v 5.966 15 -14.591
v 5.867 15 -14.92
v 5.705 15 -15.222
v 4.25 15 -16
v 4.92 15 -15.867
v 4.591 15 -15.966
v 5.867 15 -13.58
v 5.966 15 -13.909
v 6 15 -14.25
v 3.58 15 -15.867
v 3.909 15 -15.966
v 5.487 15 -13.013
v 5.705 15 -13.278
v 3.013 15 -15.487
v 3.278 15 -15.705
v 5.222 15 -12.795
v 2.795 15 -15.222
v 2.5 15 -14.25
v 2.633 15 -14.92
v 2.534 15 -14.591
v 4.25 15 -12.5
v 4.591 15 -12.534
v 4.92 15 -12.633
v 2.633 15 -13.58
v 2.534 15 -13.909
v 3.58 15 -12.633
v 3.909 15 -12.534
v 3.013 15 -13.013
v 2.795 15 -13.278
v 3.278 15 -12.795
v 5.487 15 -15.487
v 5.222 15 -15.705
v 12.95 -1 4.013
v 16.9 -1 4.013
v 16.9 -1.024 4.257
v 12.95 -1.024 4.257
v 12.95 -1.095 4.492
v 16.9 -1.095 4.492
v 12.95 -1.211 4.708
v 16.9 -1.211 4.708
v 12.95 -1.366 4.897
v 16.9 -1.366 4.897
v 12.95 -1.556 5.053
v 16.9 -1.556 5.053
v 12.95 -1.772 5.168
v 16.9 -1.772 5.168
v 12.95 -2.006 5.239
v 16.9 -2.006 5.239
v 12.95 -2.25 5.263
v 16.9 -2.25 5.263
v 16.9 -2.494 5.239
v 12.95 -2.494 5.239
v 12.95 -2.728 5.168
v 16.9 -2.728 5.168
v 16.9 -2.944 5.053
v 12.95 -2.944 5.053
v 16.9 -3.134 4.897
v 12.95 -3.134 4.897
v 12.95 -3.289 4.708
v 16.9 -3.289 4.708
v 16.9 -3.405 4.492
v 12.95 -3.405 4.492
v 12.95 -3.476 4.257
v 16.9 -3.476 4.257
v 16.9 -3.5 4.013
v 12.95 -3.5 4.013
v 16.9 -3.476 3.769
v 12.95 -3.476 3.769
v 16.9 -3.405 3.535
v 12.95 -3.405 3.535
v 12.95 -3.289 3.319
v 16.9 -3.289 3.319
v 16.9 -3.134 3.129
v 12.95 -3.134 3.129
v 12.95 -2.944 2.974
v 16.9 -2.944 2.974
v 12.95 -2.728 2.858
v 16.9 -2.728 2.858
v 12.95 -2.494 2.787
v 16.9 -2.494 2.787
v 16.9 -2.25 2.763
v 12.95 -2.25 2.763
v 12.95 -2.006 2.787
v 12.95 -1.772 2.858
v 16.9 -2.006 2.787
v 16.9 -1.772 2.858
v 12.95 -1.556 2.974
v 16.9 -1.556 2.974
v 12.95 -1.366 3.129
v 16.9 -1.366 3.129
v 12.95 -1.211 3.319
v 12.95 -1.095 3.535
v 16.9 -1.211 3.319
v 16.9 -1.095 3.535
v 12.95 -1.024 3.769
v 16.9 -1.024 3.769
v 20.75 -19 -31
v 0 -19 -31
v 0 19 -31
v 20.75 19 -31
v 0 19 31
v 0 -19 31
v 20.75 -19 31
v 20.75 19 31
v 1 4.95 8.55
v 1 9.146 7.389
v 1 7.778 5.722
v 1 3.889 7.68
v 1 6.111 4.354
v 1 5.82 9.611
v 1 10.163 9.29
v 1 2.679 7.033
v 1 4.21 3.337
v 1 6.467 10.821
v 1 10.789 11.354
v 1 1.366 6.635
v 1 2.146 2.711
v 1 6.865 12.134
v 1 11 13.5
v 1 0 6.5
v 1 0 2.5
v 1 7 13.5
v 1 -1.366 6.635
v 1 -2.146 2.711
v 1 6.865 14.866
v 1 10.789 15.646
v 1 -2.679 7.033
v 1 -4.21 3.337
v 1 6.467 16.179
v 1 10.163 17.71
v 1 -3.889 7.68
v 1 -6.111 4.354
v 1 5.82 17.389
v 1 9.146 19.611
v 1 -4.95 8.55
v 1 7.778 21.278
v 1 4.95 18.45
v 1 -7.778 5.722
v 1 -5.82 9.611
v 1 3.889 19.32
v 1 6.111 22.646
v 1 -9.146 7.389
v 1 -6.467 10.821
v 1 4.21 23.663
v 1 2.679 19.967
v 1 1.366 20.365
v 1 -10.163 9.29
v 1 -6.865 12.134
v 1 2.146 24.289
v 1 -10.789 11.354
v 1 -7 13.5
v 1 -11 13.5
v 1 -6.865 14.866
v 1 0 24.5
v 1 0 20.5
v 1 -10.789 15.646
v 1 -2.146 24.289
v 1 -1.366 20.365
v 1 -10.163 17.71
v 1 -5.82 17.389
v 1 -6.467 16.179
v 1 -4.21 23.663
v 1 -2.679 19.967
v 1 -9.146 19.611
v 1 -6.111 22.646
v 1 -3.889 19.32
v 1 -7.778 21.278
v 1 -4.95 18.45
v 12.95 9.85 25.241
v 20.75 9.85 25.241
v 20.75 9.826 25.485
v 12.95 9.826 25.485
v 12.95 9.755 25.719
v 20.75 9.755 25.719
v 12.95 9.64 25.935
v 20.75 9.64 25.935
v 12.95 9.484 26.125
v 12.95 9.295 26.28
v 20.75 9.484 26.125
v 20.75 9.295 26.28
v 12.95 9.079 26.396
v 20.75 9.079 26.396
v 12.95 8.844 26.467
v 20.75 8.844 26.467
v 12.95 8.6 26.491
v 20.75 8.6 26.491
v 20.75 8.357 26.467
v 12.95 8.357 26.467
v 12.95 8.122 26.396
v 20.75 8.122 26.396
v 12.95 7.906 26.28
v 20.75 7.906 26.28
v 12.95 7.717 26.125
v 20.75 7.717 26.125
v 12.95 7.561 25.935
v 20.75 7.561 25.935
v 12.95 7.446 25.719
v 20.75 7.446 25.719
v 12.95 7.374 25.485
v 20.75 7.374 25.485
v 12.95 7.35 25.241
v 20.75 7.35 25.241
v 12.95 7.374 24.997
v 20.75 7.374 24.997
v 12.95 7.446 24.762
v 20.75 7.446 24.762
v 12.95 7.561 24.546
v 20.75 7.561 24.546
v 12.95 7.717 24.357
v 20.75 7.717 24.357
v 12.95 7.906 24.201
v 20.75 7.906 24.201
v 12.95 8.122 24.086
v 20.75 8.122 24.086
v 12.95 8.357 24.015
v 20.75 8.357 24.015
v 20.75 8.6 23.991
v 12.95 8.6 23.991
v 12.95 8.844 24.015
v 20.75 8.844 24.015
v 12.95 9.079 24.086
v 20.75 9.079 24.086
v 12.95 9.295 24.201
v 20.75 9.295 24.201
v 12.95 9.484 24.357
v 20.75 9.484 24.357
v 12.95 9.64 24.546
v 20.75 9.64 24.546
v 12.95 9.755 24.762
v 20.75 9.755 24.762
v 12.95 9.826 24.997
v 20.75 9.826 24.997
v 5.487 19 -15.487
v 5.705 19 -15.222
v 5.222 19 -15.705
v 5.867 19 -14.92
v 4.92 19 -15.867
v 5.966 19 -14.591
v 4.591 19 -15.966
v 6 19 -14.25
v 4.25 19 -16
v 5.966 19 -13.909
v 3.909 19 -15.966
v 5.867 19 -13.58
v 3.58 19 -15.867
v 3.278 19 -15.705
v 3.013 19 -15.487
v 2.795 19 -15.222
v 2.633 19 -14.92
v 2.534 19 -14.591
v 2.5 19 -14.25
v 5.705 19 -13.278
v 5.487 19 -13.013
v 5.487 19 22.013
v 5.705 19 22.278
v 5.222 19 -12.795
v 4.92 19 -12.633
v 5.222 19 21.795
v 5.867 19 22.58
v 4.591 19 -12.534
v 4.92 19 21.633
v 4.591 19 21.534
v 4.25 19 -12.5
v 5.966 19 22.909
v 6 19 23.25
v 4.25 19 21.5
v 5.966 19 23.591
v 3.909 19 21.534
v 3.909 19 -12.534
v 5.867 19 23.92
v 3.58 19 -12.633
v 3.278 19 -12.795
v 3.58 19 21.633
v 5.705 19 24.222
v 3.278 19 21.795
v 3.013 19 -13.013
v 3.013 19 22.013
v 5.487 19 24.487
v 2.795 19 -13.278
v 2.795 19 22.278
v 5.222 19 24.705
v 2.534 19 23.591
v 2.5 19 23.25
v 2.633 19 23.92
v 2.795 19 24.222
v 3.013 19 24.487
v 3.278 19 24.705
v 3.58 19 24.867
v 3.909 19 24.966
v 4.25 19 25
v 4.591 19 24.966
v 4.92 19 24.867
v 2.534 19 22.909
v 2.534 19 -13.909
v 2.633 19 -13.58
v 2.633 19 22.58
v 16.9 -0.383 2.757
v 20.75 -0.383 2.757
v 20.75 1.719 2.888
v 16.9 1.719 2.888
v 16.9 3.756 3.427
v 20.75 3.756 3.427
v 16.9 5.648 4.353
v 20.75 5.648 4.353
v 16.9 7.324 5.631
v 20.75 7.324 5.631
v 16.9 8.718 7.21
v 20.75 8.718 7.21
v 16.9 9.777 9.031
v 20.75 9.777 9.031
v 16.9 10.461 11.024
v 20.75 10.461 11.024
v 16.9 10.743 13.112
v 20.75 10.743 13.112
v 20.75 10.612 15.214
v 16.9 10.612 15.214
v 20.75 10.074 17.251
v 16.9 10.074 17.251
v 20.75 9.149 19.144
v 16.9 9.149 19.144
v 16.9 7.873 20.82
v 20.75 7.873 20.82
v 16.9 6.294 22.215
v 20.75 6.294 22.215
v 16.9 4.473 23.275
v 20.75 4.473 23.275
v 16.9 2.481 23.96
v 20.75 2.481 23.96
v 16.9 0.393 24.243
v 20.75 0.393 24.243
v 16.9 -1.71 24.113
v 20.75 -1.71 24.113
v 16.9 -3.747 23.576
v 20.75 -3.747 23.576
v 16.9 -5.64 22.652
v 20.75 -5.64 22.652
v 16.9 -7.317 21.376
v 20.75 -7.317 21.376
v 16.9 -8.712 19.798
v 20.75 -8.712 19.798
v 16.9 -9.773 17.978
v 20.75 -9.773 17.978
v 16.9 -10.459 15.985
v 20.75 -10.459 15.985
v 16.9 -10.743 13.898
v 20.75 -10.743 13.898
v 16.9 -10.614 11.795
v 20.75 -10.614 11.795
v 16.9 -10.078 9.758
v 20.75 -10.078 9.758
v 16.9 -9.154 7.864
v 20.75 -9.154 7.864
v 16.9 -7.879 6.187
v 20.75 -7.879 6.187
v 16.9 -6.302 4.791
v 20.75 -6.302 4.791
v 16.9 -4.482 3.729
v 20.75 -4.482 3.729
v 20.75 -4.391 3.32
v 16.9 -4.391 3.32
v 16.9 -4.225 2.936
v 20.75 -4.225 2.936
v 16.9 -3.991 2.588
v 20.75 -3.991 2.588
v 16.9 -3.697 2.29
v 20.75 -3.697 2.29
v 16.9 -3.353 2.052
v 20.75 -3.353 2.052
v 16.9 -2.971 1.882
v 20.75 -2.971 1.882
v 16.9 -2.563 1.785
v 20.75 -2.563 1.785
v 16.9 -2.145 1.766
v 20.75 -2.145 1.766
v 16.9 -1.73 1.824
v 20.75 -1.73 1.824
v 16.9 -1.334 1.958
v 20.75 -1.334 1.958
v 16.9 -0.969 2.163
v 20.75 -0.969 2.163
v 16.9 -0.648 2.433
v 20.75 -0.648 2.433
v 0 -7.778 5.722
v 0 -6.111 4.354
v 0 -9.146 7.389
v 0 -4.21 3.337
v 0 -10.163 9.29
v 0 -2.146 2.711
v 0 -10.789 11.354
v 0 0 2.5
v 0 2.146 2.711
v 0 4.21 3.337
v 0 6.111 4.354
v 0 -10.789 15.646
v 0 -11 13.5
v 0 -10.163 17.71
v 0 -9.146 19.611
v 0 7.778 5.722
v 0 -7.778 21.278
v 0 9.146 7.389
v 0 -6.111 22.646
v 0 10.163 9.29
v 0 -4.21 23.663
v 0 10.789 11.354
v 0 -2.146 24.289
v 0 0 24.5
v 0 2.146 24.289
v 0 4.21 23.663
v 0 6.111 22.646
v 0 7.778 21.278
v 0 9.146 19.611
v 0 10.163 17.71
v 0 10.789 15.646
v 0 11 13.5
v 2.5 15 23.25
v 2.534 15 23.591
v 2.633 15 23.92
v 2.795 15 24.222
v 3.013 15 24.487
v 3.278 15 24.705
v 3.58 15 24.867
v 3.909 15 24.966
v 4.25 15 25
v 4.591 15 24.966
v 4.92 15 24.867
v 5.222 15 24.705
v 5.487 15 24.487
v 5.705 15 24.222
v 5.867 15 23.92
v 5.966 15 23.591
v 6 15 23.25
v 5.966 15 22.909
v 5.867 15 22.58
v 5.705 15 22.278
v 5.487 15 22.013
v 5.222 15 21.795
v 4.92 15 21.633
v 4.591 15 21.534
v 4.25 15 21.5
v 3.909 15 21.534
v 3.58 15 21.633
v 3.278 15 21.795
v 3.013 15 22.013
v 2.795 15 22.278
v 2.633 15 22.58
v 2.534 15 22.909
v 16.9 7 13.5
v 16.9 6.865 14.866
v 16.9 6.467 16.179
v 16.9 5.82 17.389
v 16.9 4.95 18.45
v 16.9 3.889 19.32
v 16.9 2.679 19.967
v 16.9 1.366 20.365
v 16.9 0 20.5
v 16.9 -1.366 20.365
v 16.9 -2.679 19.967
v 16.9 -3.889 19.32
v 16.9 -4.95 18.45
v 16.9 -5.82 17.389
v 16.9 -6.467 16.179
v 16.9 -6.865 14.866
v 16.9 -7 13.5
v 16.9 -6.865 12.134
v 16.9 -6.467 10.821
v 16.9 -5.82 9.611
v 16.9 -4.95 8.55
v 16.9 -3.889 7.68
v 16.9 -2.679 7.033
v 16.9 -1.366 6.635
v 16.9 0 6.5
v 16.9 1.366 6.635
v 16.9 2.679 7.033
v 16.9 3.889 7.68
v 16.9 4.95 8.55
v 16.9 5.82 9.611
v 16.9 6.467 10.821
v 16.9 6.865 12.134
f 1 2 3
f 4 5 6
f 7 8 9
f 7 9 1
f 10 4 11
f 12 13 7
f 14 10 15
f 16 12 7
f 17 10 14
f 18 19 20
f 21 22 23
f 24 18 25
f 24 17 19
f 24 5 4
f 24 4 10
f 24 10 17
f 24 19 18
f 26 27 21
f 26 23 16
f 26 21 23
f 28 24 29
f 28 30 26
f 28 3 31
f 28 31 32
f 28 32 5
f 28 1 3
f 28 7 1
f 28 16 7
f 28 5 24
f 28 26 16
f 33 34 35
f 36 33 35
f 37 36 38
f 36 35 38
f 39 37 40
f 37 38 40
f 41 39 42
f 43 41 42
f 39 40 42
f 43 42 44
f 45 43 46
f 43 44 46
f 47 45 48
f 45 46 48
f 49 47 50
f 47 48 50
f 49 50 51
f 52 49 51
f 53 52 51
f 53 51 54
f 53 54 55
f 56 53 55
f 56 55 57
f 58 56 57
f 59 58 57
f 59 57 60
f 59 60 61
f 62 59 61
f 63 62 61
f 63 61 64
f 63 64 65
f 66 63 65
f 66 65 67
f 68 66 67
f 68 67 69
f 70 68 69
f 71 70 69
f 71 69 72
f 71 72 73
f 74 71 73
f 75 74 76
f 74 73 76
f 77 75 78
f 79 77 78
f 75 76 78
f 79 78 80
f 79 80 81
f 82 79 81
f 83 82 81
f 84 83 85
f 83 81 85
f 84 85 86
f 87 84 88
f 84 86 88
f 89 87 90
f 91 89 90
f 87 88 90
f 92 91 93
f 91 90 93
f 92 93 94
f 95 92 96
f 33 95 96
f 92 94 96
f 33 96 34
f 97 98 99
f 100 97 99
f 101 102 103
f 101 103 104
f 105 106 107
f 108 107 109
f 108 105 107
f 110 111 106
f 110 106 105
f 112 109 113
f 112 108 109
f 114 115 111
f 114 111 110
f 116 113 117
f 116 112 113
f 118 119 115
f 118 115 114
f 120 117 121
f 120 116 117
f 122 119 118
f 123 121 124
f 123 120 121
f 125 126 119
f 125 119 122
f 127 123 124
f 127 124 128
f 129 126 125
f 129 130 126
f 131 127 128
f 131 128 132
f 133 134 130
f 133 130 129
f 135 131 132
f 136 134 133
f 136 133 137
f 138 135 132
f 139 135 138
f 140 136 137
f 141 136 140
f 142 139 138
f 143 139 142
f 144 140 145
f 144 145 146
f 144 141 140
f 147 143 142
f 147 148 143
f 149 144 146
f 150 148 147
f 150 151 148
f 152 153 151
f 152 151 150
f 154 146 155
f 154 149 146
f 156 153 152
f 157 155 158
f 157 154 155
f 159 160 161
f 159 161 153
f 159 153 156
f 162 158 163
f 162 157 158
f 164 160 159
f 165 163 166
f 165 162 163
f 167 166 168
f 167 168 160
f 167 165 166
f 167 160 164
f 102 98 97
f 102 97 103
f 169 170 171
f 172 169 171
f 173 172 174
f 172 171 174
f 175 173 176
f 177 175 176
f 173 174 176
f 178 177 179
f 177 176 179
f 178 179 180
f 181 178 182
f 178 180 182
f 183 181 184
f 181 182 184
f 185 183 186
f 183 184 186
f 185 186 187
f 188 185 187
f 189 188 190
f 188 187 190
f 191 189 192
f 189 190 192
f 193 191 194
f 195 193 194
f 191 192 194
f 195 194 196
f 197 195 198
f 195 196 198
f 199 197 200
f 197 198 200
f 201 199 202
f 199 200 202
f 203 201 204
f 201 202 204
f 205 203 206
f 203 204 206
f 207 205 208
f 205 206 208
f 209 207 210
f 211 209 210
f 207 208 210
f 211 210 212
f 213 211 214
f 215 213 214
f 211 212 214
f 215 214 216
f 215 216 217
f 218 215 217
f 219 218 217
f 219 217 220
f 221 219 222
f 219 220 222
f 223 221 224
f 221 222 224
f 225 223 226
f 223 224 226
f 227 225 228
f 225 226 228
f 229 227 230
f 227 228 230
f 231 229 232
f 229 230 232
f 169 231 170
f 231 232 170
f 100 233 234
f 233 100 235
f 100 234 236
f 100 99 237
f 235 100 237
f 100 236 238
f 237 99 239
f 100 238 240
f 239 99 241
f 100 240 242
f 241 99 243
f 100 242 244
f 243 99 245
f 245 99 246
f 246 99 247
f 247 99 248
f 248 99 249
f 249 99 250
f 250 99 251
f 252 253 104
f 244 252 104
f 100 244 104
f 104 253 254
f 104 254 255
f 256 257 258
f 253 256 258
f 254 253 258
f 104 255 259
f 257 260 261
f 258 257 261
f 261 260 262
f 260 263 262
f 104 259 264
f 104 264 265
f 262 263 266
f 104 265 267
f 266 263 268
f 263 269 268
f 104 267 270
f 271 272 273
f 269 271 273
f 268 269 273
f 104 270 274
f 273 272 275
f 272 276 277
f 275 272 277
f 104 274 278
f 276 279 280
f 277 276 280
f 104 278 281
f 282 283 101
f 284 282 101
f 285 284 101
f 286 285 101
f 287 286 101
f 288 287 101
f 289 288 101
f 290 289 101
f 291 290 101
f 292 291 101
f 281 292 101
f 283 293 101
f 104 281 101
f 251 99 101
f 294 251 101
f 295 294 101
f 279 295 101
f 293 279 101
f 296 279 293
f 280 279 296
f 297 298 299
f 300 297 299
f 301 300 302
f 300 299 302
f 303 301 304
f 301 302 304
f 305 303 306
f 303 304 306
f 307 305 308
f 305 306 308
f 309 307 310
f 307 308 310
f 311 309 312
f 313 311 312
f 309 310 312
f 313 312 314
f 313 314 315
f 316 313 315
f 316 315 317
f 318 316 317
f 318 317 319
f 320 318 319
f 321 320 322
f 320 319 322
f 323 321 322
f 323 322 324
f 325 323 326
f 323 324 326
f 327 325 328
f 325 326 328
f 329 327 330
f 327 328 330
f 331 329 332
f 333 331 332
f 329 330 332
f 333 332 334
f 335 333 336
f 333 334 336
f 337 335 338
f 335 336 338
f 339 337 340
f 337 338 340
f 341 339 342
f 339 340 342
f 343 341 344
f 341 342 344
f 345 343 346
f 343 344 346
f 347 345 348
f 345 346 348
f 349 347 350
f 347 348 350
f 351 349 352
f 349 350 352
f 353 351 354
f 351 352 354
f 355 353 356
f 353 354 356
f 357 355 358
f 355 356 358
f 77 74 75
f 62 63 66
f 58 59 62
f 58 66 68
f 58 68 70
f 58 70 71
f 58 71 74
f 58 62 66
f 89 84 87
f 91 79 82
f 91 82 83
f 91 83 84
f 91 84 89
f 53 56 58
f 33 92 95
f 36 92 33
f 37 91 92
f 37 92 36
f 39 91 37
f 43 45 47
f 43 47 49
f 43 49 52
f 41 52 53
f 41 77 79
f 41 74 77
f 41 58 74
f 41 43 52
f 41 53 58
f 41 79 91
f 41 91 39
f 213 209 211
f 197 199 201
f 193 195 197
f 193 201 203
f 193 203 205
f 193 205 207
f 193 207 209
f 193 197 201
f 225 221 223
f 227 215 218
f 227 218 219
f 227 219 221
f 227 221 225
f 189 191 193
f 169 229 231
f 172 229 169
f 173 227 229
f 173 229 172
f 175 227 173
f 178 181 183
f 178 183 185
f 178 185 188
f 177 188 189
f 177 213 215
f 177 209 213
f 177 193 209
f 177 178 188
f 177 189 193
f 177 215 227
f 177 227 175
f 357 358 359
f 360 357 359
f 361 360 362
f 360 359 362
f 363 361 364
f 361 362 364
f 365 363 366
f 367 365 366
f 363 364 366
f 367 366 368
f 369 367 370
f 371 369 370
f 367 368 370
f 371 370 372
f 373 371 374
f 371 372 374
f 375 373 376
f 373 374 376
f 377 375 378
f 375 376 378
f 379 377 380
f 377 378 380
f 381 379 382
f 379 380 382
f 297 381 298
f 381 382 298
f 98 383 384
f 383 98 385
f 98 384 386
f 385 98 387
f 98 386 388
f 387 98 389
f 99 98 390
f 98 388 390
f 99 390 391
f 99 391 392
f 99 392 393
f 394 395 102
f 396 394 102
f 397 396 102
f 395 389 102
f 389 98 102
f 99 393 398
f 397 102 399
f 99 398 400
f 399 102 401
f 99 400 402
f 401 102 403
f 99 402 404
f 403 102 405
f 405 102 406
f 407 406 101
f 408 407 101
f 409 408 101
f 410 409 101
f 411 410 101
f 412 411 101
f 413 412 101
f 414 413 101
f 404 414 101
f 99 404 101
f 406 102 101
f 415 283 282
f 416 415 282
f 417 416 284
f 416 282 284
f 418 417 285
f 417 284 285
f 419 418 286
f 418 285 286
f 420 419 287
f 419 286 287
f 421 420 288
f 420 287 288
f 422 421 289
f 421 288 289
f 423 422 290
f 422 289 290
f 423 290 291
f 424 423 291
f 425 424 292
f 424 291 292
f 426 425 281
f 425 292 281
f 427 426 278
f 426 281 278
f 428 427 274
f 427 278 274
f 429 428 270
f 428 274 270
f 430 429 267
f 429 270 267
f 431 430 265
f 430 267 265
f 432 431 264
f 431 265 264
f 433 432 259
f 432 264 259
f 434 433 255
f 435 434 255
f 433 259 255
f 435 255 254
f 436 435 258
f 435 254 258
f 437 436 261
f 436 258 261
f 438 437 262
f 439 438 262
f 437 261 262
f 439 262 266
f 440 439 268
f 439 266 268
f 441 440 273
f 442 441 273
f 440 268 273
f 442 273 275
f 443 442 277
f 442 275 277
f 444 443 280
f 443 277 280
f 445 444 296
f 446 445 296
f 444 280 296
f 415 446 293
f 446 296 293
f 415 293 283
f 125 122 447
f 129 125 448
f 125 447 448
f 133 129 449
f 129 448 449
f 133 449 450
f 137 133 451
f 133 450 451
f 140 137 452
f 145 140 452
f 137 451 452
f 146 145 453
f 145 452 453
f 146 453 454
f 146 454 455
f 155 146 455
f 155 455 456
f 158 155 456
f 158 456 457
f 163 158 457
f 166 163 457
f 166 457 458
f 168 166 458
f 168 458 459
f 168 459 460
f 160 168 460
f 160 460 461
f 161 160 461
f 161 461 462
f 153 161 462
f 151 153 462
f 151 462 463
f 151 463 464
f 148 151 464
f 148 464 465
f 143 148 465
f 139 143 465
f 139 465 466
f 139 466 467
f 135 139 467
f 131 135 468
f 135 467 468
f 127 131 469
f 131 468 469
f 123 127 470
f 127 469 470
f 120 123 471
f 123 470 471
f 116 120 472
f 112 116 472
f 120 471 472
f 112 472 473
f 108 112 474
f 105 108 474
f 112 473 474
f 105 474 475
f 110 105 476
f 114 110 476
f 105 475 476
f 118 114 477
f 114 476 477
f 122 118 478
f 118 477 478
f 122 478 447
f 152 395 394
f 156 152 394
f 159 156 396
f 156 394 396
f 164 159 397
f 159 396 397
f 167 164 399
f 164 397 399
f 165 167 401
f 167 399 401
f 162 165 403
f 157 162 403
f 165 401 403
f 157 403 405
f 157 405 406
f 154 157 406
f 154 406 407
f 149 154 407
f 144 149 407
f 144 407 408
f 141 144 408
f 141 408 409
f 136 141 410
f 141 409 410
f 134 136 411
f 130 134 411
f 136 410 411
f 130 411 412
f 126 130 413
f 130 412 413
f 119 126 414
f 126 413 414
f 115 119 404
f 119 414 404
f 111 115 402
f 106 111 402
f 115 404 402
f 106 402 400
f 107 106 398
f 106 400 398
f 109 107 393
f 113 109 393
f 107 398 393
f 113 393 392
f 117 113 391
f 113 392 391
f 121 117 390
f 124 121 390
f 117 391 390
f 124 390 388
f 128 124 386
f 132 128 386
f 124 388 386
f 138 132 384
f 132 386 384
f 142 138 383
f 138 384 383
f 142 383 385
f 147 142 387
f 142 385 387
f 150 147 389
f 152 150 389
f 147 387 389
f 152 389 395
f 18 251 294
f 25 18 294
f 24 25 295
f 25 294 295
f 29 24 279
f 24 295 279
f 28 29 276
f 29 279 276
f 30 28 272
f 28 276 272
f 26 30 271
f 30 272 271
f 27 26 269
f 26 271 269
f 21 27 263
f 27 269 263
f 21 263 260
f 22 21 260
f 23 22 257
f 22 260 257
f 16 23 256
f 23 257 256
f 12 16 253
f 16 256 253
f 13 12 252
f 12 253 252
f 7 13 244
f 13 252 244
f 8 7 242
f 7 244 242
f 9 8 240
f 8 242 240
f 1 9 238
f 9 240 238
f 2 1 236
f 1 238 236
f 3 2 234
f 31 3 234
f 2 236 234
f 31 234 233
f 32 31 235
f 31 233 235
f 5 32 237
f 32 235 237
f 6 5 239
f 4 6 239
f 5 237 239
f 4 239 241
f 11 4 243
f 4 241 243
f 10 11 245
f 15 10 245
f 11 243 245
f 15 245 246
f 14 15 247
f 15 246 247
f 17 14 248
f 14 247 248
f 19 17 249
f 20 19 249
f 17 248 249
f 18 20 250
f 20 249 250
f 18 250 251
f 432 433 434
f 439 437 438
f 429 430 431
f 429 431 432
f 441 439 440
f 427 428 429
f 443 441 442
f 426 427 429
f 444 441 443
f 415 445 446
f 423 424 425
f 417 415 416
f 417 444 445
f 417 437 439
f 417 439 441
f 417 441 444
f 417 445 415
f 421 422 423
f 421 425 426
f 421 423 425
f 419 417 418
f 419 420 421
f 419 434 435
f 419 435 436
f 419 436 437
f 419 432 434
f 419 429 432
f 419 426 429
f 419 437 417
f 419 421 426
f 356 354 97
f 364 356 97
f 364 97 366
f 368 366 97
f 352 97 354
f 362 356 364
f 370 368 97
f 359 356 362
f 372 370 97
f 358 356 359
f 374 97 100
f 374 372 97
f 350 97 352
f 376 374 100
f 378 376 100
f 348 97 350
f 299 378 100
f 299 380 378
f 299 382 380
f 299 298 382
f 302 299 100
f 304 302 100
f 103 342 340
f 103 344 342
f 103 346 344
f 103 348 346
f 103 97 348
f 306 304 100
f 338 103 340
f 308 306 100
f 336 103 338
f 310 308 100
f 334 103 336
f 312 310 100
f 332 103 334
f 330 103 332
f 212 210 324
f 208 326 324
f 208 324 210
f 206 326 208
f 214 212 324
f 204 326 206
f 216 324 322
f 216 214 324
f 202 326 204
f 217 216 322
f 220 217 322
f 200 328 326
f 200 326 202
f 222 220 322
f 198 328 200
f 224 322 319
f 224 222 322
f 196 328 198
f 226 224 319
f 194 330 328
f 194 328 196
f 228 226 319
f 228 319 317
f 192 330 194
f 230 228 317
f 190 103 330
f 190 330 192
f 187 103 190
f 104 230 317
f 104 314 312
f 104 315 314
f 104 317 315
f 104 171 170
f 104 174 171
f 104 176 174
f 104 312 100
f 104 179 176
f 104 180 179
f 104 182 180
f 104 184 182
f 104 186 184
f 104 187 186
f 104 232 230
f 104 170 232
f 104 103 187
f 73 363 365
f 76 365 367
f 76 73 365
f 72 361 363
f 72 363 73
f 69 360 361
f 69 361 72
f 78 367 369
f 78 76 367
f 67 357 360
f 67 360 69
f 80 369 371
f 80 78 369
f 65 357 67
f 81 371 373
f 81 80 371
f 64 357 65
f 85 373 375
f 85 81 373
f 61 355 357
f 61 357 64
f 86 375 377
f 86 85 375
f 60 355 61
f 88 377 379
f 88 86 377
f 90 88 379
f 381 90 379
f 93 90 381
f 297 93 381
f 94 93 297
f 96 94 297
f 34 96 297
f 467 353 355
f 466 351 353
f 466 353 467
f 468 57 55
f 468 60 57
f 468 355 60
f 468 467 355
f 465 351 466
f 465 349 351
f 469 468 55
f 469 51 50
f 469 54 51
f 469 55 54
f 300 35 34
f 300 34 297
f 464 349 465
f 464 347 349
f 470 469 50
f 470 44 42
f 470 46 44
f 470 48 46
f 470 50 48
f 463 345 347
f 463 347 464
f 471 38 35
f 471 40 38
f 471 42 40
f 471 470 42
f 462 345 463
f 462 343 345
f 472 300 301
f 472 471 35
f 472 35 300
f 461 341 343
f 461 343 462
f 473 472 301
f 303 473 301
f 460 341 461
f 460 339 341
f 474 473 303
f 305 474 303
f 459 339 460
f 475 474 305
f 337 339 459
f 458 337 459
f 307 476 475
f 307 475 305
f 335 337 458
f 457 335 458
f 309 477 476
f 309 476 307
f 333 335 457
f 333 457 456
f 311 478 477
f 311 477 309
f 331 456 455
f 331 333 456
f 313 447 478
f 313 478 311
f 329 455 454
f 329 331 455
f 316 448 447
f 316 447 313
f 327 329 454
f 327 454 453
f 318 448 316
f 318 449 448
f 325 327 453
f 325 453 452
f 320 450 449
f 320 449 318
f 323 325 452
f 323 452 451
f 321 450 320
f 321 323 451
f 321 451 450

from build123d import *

# Parameters (mm, degrees)
F0_W     = 38
F0_H     = 62
F1_DEPTH = 20.75
F2_R     = 1.25
F2_R_2   = 7
F3_DEPTH = 3.85
F4_DEPTH = 7.8
F5_DEPTH = 20.751
F6_R     = 11
F6_R_2   = 7
F7_DEPTH = 1
F8_R     = 1.75
F9_DEPTH = 4


with BuildPart() as f1:
    # F0 (on Right) → F1 (new body)
    with BuildSketch(Plane.YZ):
        Rectangle(F0_W, F0_H)
    extrude(amount=F1_DEPTH)

    # F2 (on face) → F3 (cut)
    with BuildSketch(Plane.YZ.offset(20.75)):
        with BuildLine():
            ThreePointArc((-4.48197, 3.728898), (-2.769231, 1.823898), (-0.383414, 2.75684))
            ThreePointArc((-0.383414, 2.75684), (2.480769, 23.959841), (-4.48197, 3.728898))
        make_face()
        with Locations((-2.25, 4.013167)):
            Circle(F2_R, mode=Mode.SUBTRACT)
        with Locations((0, 13.5)):
            Circle(F2_R_2, mode=Mode.SUBTRACT)
    extrude(amount=-F3_DEPTH, mode=Mode.SUBTRACT)

    # F2 (on face) → F4 (cut)
    with BuildSketch(Plane.YZ.offset(20.75)):
        with Locations((-2.25, 4.013167)):
            Circle(F2_R)
        with Locations((8.600429, 25.240833)):
            Circle(F2_R)
    extrude(amount=-F4_DEPTH, mode=Mode.SUBTRACT)

    # F2 (on face) → F5 (cut, through all)
    with BuildSketch(Plane.YZ.offset(20.75)):
        with Locations((0, 13.5)):
            Circle(F2_R_2)
    extrude(amount=-F5_DEPTH, mode=Mode.SUBTRACT)

    # F6 (on face) → F7 (cut)
    with BuildSketch(Plane(origin=(0, 0, 0), x_dir=(0, -1, 0), z_dir=(-1, 0, 0))):
        with Locations((0, 13.5)):
            Circle(F6_R)
        with Locations((0, 13.5)):
            Circle(F6_R_2, mode=Mode.SUBTRACT)
    extrude(amount=-F7_DEPTH, mode=Mode.SUBTRACT)

    # F8 (on face) → F9 (cut)
    with BuildSketch(Plane(origin=(0, 19, 0), x_dir=(-1, 0, 0), z_dir=(0, 1, 0))):
        with Locations((-4.25, 23.25)):
            Circle(F8_R)
        with Locations((-4.25, -14.25)):
            Circle(F8_R)
    extrude(amount=-F9_DEPTH, mode=Mode.SUBTRACT)


solid = f1.part
